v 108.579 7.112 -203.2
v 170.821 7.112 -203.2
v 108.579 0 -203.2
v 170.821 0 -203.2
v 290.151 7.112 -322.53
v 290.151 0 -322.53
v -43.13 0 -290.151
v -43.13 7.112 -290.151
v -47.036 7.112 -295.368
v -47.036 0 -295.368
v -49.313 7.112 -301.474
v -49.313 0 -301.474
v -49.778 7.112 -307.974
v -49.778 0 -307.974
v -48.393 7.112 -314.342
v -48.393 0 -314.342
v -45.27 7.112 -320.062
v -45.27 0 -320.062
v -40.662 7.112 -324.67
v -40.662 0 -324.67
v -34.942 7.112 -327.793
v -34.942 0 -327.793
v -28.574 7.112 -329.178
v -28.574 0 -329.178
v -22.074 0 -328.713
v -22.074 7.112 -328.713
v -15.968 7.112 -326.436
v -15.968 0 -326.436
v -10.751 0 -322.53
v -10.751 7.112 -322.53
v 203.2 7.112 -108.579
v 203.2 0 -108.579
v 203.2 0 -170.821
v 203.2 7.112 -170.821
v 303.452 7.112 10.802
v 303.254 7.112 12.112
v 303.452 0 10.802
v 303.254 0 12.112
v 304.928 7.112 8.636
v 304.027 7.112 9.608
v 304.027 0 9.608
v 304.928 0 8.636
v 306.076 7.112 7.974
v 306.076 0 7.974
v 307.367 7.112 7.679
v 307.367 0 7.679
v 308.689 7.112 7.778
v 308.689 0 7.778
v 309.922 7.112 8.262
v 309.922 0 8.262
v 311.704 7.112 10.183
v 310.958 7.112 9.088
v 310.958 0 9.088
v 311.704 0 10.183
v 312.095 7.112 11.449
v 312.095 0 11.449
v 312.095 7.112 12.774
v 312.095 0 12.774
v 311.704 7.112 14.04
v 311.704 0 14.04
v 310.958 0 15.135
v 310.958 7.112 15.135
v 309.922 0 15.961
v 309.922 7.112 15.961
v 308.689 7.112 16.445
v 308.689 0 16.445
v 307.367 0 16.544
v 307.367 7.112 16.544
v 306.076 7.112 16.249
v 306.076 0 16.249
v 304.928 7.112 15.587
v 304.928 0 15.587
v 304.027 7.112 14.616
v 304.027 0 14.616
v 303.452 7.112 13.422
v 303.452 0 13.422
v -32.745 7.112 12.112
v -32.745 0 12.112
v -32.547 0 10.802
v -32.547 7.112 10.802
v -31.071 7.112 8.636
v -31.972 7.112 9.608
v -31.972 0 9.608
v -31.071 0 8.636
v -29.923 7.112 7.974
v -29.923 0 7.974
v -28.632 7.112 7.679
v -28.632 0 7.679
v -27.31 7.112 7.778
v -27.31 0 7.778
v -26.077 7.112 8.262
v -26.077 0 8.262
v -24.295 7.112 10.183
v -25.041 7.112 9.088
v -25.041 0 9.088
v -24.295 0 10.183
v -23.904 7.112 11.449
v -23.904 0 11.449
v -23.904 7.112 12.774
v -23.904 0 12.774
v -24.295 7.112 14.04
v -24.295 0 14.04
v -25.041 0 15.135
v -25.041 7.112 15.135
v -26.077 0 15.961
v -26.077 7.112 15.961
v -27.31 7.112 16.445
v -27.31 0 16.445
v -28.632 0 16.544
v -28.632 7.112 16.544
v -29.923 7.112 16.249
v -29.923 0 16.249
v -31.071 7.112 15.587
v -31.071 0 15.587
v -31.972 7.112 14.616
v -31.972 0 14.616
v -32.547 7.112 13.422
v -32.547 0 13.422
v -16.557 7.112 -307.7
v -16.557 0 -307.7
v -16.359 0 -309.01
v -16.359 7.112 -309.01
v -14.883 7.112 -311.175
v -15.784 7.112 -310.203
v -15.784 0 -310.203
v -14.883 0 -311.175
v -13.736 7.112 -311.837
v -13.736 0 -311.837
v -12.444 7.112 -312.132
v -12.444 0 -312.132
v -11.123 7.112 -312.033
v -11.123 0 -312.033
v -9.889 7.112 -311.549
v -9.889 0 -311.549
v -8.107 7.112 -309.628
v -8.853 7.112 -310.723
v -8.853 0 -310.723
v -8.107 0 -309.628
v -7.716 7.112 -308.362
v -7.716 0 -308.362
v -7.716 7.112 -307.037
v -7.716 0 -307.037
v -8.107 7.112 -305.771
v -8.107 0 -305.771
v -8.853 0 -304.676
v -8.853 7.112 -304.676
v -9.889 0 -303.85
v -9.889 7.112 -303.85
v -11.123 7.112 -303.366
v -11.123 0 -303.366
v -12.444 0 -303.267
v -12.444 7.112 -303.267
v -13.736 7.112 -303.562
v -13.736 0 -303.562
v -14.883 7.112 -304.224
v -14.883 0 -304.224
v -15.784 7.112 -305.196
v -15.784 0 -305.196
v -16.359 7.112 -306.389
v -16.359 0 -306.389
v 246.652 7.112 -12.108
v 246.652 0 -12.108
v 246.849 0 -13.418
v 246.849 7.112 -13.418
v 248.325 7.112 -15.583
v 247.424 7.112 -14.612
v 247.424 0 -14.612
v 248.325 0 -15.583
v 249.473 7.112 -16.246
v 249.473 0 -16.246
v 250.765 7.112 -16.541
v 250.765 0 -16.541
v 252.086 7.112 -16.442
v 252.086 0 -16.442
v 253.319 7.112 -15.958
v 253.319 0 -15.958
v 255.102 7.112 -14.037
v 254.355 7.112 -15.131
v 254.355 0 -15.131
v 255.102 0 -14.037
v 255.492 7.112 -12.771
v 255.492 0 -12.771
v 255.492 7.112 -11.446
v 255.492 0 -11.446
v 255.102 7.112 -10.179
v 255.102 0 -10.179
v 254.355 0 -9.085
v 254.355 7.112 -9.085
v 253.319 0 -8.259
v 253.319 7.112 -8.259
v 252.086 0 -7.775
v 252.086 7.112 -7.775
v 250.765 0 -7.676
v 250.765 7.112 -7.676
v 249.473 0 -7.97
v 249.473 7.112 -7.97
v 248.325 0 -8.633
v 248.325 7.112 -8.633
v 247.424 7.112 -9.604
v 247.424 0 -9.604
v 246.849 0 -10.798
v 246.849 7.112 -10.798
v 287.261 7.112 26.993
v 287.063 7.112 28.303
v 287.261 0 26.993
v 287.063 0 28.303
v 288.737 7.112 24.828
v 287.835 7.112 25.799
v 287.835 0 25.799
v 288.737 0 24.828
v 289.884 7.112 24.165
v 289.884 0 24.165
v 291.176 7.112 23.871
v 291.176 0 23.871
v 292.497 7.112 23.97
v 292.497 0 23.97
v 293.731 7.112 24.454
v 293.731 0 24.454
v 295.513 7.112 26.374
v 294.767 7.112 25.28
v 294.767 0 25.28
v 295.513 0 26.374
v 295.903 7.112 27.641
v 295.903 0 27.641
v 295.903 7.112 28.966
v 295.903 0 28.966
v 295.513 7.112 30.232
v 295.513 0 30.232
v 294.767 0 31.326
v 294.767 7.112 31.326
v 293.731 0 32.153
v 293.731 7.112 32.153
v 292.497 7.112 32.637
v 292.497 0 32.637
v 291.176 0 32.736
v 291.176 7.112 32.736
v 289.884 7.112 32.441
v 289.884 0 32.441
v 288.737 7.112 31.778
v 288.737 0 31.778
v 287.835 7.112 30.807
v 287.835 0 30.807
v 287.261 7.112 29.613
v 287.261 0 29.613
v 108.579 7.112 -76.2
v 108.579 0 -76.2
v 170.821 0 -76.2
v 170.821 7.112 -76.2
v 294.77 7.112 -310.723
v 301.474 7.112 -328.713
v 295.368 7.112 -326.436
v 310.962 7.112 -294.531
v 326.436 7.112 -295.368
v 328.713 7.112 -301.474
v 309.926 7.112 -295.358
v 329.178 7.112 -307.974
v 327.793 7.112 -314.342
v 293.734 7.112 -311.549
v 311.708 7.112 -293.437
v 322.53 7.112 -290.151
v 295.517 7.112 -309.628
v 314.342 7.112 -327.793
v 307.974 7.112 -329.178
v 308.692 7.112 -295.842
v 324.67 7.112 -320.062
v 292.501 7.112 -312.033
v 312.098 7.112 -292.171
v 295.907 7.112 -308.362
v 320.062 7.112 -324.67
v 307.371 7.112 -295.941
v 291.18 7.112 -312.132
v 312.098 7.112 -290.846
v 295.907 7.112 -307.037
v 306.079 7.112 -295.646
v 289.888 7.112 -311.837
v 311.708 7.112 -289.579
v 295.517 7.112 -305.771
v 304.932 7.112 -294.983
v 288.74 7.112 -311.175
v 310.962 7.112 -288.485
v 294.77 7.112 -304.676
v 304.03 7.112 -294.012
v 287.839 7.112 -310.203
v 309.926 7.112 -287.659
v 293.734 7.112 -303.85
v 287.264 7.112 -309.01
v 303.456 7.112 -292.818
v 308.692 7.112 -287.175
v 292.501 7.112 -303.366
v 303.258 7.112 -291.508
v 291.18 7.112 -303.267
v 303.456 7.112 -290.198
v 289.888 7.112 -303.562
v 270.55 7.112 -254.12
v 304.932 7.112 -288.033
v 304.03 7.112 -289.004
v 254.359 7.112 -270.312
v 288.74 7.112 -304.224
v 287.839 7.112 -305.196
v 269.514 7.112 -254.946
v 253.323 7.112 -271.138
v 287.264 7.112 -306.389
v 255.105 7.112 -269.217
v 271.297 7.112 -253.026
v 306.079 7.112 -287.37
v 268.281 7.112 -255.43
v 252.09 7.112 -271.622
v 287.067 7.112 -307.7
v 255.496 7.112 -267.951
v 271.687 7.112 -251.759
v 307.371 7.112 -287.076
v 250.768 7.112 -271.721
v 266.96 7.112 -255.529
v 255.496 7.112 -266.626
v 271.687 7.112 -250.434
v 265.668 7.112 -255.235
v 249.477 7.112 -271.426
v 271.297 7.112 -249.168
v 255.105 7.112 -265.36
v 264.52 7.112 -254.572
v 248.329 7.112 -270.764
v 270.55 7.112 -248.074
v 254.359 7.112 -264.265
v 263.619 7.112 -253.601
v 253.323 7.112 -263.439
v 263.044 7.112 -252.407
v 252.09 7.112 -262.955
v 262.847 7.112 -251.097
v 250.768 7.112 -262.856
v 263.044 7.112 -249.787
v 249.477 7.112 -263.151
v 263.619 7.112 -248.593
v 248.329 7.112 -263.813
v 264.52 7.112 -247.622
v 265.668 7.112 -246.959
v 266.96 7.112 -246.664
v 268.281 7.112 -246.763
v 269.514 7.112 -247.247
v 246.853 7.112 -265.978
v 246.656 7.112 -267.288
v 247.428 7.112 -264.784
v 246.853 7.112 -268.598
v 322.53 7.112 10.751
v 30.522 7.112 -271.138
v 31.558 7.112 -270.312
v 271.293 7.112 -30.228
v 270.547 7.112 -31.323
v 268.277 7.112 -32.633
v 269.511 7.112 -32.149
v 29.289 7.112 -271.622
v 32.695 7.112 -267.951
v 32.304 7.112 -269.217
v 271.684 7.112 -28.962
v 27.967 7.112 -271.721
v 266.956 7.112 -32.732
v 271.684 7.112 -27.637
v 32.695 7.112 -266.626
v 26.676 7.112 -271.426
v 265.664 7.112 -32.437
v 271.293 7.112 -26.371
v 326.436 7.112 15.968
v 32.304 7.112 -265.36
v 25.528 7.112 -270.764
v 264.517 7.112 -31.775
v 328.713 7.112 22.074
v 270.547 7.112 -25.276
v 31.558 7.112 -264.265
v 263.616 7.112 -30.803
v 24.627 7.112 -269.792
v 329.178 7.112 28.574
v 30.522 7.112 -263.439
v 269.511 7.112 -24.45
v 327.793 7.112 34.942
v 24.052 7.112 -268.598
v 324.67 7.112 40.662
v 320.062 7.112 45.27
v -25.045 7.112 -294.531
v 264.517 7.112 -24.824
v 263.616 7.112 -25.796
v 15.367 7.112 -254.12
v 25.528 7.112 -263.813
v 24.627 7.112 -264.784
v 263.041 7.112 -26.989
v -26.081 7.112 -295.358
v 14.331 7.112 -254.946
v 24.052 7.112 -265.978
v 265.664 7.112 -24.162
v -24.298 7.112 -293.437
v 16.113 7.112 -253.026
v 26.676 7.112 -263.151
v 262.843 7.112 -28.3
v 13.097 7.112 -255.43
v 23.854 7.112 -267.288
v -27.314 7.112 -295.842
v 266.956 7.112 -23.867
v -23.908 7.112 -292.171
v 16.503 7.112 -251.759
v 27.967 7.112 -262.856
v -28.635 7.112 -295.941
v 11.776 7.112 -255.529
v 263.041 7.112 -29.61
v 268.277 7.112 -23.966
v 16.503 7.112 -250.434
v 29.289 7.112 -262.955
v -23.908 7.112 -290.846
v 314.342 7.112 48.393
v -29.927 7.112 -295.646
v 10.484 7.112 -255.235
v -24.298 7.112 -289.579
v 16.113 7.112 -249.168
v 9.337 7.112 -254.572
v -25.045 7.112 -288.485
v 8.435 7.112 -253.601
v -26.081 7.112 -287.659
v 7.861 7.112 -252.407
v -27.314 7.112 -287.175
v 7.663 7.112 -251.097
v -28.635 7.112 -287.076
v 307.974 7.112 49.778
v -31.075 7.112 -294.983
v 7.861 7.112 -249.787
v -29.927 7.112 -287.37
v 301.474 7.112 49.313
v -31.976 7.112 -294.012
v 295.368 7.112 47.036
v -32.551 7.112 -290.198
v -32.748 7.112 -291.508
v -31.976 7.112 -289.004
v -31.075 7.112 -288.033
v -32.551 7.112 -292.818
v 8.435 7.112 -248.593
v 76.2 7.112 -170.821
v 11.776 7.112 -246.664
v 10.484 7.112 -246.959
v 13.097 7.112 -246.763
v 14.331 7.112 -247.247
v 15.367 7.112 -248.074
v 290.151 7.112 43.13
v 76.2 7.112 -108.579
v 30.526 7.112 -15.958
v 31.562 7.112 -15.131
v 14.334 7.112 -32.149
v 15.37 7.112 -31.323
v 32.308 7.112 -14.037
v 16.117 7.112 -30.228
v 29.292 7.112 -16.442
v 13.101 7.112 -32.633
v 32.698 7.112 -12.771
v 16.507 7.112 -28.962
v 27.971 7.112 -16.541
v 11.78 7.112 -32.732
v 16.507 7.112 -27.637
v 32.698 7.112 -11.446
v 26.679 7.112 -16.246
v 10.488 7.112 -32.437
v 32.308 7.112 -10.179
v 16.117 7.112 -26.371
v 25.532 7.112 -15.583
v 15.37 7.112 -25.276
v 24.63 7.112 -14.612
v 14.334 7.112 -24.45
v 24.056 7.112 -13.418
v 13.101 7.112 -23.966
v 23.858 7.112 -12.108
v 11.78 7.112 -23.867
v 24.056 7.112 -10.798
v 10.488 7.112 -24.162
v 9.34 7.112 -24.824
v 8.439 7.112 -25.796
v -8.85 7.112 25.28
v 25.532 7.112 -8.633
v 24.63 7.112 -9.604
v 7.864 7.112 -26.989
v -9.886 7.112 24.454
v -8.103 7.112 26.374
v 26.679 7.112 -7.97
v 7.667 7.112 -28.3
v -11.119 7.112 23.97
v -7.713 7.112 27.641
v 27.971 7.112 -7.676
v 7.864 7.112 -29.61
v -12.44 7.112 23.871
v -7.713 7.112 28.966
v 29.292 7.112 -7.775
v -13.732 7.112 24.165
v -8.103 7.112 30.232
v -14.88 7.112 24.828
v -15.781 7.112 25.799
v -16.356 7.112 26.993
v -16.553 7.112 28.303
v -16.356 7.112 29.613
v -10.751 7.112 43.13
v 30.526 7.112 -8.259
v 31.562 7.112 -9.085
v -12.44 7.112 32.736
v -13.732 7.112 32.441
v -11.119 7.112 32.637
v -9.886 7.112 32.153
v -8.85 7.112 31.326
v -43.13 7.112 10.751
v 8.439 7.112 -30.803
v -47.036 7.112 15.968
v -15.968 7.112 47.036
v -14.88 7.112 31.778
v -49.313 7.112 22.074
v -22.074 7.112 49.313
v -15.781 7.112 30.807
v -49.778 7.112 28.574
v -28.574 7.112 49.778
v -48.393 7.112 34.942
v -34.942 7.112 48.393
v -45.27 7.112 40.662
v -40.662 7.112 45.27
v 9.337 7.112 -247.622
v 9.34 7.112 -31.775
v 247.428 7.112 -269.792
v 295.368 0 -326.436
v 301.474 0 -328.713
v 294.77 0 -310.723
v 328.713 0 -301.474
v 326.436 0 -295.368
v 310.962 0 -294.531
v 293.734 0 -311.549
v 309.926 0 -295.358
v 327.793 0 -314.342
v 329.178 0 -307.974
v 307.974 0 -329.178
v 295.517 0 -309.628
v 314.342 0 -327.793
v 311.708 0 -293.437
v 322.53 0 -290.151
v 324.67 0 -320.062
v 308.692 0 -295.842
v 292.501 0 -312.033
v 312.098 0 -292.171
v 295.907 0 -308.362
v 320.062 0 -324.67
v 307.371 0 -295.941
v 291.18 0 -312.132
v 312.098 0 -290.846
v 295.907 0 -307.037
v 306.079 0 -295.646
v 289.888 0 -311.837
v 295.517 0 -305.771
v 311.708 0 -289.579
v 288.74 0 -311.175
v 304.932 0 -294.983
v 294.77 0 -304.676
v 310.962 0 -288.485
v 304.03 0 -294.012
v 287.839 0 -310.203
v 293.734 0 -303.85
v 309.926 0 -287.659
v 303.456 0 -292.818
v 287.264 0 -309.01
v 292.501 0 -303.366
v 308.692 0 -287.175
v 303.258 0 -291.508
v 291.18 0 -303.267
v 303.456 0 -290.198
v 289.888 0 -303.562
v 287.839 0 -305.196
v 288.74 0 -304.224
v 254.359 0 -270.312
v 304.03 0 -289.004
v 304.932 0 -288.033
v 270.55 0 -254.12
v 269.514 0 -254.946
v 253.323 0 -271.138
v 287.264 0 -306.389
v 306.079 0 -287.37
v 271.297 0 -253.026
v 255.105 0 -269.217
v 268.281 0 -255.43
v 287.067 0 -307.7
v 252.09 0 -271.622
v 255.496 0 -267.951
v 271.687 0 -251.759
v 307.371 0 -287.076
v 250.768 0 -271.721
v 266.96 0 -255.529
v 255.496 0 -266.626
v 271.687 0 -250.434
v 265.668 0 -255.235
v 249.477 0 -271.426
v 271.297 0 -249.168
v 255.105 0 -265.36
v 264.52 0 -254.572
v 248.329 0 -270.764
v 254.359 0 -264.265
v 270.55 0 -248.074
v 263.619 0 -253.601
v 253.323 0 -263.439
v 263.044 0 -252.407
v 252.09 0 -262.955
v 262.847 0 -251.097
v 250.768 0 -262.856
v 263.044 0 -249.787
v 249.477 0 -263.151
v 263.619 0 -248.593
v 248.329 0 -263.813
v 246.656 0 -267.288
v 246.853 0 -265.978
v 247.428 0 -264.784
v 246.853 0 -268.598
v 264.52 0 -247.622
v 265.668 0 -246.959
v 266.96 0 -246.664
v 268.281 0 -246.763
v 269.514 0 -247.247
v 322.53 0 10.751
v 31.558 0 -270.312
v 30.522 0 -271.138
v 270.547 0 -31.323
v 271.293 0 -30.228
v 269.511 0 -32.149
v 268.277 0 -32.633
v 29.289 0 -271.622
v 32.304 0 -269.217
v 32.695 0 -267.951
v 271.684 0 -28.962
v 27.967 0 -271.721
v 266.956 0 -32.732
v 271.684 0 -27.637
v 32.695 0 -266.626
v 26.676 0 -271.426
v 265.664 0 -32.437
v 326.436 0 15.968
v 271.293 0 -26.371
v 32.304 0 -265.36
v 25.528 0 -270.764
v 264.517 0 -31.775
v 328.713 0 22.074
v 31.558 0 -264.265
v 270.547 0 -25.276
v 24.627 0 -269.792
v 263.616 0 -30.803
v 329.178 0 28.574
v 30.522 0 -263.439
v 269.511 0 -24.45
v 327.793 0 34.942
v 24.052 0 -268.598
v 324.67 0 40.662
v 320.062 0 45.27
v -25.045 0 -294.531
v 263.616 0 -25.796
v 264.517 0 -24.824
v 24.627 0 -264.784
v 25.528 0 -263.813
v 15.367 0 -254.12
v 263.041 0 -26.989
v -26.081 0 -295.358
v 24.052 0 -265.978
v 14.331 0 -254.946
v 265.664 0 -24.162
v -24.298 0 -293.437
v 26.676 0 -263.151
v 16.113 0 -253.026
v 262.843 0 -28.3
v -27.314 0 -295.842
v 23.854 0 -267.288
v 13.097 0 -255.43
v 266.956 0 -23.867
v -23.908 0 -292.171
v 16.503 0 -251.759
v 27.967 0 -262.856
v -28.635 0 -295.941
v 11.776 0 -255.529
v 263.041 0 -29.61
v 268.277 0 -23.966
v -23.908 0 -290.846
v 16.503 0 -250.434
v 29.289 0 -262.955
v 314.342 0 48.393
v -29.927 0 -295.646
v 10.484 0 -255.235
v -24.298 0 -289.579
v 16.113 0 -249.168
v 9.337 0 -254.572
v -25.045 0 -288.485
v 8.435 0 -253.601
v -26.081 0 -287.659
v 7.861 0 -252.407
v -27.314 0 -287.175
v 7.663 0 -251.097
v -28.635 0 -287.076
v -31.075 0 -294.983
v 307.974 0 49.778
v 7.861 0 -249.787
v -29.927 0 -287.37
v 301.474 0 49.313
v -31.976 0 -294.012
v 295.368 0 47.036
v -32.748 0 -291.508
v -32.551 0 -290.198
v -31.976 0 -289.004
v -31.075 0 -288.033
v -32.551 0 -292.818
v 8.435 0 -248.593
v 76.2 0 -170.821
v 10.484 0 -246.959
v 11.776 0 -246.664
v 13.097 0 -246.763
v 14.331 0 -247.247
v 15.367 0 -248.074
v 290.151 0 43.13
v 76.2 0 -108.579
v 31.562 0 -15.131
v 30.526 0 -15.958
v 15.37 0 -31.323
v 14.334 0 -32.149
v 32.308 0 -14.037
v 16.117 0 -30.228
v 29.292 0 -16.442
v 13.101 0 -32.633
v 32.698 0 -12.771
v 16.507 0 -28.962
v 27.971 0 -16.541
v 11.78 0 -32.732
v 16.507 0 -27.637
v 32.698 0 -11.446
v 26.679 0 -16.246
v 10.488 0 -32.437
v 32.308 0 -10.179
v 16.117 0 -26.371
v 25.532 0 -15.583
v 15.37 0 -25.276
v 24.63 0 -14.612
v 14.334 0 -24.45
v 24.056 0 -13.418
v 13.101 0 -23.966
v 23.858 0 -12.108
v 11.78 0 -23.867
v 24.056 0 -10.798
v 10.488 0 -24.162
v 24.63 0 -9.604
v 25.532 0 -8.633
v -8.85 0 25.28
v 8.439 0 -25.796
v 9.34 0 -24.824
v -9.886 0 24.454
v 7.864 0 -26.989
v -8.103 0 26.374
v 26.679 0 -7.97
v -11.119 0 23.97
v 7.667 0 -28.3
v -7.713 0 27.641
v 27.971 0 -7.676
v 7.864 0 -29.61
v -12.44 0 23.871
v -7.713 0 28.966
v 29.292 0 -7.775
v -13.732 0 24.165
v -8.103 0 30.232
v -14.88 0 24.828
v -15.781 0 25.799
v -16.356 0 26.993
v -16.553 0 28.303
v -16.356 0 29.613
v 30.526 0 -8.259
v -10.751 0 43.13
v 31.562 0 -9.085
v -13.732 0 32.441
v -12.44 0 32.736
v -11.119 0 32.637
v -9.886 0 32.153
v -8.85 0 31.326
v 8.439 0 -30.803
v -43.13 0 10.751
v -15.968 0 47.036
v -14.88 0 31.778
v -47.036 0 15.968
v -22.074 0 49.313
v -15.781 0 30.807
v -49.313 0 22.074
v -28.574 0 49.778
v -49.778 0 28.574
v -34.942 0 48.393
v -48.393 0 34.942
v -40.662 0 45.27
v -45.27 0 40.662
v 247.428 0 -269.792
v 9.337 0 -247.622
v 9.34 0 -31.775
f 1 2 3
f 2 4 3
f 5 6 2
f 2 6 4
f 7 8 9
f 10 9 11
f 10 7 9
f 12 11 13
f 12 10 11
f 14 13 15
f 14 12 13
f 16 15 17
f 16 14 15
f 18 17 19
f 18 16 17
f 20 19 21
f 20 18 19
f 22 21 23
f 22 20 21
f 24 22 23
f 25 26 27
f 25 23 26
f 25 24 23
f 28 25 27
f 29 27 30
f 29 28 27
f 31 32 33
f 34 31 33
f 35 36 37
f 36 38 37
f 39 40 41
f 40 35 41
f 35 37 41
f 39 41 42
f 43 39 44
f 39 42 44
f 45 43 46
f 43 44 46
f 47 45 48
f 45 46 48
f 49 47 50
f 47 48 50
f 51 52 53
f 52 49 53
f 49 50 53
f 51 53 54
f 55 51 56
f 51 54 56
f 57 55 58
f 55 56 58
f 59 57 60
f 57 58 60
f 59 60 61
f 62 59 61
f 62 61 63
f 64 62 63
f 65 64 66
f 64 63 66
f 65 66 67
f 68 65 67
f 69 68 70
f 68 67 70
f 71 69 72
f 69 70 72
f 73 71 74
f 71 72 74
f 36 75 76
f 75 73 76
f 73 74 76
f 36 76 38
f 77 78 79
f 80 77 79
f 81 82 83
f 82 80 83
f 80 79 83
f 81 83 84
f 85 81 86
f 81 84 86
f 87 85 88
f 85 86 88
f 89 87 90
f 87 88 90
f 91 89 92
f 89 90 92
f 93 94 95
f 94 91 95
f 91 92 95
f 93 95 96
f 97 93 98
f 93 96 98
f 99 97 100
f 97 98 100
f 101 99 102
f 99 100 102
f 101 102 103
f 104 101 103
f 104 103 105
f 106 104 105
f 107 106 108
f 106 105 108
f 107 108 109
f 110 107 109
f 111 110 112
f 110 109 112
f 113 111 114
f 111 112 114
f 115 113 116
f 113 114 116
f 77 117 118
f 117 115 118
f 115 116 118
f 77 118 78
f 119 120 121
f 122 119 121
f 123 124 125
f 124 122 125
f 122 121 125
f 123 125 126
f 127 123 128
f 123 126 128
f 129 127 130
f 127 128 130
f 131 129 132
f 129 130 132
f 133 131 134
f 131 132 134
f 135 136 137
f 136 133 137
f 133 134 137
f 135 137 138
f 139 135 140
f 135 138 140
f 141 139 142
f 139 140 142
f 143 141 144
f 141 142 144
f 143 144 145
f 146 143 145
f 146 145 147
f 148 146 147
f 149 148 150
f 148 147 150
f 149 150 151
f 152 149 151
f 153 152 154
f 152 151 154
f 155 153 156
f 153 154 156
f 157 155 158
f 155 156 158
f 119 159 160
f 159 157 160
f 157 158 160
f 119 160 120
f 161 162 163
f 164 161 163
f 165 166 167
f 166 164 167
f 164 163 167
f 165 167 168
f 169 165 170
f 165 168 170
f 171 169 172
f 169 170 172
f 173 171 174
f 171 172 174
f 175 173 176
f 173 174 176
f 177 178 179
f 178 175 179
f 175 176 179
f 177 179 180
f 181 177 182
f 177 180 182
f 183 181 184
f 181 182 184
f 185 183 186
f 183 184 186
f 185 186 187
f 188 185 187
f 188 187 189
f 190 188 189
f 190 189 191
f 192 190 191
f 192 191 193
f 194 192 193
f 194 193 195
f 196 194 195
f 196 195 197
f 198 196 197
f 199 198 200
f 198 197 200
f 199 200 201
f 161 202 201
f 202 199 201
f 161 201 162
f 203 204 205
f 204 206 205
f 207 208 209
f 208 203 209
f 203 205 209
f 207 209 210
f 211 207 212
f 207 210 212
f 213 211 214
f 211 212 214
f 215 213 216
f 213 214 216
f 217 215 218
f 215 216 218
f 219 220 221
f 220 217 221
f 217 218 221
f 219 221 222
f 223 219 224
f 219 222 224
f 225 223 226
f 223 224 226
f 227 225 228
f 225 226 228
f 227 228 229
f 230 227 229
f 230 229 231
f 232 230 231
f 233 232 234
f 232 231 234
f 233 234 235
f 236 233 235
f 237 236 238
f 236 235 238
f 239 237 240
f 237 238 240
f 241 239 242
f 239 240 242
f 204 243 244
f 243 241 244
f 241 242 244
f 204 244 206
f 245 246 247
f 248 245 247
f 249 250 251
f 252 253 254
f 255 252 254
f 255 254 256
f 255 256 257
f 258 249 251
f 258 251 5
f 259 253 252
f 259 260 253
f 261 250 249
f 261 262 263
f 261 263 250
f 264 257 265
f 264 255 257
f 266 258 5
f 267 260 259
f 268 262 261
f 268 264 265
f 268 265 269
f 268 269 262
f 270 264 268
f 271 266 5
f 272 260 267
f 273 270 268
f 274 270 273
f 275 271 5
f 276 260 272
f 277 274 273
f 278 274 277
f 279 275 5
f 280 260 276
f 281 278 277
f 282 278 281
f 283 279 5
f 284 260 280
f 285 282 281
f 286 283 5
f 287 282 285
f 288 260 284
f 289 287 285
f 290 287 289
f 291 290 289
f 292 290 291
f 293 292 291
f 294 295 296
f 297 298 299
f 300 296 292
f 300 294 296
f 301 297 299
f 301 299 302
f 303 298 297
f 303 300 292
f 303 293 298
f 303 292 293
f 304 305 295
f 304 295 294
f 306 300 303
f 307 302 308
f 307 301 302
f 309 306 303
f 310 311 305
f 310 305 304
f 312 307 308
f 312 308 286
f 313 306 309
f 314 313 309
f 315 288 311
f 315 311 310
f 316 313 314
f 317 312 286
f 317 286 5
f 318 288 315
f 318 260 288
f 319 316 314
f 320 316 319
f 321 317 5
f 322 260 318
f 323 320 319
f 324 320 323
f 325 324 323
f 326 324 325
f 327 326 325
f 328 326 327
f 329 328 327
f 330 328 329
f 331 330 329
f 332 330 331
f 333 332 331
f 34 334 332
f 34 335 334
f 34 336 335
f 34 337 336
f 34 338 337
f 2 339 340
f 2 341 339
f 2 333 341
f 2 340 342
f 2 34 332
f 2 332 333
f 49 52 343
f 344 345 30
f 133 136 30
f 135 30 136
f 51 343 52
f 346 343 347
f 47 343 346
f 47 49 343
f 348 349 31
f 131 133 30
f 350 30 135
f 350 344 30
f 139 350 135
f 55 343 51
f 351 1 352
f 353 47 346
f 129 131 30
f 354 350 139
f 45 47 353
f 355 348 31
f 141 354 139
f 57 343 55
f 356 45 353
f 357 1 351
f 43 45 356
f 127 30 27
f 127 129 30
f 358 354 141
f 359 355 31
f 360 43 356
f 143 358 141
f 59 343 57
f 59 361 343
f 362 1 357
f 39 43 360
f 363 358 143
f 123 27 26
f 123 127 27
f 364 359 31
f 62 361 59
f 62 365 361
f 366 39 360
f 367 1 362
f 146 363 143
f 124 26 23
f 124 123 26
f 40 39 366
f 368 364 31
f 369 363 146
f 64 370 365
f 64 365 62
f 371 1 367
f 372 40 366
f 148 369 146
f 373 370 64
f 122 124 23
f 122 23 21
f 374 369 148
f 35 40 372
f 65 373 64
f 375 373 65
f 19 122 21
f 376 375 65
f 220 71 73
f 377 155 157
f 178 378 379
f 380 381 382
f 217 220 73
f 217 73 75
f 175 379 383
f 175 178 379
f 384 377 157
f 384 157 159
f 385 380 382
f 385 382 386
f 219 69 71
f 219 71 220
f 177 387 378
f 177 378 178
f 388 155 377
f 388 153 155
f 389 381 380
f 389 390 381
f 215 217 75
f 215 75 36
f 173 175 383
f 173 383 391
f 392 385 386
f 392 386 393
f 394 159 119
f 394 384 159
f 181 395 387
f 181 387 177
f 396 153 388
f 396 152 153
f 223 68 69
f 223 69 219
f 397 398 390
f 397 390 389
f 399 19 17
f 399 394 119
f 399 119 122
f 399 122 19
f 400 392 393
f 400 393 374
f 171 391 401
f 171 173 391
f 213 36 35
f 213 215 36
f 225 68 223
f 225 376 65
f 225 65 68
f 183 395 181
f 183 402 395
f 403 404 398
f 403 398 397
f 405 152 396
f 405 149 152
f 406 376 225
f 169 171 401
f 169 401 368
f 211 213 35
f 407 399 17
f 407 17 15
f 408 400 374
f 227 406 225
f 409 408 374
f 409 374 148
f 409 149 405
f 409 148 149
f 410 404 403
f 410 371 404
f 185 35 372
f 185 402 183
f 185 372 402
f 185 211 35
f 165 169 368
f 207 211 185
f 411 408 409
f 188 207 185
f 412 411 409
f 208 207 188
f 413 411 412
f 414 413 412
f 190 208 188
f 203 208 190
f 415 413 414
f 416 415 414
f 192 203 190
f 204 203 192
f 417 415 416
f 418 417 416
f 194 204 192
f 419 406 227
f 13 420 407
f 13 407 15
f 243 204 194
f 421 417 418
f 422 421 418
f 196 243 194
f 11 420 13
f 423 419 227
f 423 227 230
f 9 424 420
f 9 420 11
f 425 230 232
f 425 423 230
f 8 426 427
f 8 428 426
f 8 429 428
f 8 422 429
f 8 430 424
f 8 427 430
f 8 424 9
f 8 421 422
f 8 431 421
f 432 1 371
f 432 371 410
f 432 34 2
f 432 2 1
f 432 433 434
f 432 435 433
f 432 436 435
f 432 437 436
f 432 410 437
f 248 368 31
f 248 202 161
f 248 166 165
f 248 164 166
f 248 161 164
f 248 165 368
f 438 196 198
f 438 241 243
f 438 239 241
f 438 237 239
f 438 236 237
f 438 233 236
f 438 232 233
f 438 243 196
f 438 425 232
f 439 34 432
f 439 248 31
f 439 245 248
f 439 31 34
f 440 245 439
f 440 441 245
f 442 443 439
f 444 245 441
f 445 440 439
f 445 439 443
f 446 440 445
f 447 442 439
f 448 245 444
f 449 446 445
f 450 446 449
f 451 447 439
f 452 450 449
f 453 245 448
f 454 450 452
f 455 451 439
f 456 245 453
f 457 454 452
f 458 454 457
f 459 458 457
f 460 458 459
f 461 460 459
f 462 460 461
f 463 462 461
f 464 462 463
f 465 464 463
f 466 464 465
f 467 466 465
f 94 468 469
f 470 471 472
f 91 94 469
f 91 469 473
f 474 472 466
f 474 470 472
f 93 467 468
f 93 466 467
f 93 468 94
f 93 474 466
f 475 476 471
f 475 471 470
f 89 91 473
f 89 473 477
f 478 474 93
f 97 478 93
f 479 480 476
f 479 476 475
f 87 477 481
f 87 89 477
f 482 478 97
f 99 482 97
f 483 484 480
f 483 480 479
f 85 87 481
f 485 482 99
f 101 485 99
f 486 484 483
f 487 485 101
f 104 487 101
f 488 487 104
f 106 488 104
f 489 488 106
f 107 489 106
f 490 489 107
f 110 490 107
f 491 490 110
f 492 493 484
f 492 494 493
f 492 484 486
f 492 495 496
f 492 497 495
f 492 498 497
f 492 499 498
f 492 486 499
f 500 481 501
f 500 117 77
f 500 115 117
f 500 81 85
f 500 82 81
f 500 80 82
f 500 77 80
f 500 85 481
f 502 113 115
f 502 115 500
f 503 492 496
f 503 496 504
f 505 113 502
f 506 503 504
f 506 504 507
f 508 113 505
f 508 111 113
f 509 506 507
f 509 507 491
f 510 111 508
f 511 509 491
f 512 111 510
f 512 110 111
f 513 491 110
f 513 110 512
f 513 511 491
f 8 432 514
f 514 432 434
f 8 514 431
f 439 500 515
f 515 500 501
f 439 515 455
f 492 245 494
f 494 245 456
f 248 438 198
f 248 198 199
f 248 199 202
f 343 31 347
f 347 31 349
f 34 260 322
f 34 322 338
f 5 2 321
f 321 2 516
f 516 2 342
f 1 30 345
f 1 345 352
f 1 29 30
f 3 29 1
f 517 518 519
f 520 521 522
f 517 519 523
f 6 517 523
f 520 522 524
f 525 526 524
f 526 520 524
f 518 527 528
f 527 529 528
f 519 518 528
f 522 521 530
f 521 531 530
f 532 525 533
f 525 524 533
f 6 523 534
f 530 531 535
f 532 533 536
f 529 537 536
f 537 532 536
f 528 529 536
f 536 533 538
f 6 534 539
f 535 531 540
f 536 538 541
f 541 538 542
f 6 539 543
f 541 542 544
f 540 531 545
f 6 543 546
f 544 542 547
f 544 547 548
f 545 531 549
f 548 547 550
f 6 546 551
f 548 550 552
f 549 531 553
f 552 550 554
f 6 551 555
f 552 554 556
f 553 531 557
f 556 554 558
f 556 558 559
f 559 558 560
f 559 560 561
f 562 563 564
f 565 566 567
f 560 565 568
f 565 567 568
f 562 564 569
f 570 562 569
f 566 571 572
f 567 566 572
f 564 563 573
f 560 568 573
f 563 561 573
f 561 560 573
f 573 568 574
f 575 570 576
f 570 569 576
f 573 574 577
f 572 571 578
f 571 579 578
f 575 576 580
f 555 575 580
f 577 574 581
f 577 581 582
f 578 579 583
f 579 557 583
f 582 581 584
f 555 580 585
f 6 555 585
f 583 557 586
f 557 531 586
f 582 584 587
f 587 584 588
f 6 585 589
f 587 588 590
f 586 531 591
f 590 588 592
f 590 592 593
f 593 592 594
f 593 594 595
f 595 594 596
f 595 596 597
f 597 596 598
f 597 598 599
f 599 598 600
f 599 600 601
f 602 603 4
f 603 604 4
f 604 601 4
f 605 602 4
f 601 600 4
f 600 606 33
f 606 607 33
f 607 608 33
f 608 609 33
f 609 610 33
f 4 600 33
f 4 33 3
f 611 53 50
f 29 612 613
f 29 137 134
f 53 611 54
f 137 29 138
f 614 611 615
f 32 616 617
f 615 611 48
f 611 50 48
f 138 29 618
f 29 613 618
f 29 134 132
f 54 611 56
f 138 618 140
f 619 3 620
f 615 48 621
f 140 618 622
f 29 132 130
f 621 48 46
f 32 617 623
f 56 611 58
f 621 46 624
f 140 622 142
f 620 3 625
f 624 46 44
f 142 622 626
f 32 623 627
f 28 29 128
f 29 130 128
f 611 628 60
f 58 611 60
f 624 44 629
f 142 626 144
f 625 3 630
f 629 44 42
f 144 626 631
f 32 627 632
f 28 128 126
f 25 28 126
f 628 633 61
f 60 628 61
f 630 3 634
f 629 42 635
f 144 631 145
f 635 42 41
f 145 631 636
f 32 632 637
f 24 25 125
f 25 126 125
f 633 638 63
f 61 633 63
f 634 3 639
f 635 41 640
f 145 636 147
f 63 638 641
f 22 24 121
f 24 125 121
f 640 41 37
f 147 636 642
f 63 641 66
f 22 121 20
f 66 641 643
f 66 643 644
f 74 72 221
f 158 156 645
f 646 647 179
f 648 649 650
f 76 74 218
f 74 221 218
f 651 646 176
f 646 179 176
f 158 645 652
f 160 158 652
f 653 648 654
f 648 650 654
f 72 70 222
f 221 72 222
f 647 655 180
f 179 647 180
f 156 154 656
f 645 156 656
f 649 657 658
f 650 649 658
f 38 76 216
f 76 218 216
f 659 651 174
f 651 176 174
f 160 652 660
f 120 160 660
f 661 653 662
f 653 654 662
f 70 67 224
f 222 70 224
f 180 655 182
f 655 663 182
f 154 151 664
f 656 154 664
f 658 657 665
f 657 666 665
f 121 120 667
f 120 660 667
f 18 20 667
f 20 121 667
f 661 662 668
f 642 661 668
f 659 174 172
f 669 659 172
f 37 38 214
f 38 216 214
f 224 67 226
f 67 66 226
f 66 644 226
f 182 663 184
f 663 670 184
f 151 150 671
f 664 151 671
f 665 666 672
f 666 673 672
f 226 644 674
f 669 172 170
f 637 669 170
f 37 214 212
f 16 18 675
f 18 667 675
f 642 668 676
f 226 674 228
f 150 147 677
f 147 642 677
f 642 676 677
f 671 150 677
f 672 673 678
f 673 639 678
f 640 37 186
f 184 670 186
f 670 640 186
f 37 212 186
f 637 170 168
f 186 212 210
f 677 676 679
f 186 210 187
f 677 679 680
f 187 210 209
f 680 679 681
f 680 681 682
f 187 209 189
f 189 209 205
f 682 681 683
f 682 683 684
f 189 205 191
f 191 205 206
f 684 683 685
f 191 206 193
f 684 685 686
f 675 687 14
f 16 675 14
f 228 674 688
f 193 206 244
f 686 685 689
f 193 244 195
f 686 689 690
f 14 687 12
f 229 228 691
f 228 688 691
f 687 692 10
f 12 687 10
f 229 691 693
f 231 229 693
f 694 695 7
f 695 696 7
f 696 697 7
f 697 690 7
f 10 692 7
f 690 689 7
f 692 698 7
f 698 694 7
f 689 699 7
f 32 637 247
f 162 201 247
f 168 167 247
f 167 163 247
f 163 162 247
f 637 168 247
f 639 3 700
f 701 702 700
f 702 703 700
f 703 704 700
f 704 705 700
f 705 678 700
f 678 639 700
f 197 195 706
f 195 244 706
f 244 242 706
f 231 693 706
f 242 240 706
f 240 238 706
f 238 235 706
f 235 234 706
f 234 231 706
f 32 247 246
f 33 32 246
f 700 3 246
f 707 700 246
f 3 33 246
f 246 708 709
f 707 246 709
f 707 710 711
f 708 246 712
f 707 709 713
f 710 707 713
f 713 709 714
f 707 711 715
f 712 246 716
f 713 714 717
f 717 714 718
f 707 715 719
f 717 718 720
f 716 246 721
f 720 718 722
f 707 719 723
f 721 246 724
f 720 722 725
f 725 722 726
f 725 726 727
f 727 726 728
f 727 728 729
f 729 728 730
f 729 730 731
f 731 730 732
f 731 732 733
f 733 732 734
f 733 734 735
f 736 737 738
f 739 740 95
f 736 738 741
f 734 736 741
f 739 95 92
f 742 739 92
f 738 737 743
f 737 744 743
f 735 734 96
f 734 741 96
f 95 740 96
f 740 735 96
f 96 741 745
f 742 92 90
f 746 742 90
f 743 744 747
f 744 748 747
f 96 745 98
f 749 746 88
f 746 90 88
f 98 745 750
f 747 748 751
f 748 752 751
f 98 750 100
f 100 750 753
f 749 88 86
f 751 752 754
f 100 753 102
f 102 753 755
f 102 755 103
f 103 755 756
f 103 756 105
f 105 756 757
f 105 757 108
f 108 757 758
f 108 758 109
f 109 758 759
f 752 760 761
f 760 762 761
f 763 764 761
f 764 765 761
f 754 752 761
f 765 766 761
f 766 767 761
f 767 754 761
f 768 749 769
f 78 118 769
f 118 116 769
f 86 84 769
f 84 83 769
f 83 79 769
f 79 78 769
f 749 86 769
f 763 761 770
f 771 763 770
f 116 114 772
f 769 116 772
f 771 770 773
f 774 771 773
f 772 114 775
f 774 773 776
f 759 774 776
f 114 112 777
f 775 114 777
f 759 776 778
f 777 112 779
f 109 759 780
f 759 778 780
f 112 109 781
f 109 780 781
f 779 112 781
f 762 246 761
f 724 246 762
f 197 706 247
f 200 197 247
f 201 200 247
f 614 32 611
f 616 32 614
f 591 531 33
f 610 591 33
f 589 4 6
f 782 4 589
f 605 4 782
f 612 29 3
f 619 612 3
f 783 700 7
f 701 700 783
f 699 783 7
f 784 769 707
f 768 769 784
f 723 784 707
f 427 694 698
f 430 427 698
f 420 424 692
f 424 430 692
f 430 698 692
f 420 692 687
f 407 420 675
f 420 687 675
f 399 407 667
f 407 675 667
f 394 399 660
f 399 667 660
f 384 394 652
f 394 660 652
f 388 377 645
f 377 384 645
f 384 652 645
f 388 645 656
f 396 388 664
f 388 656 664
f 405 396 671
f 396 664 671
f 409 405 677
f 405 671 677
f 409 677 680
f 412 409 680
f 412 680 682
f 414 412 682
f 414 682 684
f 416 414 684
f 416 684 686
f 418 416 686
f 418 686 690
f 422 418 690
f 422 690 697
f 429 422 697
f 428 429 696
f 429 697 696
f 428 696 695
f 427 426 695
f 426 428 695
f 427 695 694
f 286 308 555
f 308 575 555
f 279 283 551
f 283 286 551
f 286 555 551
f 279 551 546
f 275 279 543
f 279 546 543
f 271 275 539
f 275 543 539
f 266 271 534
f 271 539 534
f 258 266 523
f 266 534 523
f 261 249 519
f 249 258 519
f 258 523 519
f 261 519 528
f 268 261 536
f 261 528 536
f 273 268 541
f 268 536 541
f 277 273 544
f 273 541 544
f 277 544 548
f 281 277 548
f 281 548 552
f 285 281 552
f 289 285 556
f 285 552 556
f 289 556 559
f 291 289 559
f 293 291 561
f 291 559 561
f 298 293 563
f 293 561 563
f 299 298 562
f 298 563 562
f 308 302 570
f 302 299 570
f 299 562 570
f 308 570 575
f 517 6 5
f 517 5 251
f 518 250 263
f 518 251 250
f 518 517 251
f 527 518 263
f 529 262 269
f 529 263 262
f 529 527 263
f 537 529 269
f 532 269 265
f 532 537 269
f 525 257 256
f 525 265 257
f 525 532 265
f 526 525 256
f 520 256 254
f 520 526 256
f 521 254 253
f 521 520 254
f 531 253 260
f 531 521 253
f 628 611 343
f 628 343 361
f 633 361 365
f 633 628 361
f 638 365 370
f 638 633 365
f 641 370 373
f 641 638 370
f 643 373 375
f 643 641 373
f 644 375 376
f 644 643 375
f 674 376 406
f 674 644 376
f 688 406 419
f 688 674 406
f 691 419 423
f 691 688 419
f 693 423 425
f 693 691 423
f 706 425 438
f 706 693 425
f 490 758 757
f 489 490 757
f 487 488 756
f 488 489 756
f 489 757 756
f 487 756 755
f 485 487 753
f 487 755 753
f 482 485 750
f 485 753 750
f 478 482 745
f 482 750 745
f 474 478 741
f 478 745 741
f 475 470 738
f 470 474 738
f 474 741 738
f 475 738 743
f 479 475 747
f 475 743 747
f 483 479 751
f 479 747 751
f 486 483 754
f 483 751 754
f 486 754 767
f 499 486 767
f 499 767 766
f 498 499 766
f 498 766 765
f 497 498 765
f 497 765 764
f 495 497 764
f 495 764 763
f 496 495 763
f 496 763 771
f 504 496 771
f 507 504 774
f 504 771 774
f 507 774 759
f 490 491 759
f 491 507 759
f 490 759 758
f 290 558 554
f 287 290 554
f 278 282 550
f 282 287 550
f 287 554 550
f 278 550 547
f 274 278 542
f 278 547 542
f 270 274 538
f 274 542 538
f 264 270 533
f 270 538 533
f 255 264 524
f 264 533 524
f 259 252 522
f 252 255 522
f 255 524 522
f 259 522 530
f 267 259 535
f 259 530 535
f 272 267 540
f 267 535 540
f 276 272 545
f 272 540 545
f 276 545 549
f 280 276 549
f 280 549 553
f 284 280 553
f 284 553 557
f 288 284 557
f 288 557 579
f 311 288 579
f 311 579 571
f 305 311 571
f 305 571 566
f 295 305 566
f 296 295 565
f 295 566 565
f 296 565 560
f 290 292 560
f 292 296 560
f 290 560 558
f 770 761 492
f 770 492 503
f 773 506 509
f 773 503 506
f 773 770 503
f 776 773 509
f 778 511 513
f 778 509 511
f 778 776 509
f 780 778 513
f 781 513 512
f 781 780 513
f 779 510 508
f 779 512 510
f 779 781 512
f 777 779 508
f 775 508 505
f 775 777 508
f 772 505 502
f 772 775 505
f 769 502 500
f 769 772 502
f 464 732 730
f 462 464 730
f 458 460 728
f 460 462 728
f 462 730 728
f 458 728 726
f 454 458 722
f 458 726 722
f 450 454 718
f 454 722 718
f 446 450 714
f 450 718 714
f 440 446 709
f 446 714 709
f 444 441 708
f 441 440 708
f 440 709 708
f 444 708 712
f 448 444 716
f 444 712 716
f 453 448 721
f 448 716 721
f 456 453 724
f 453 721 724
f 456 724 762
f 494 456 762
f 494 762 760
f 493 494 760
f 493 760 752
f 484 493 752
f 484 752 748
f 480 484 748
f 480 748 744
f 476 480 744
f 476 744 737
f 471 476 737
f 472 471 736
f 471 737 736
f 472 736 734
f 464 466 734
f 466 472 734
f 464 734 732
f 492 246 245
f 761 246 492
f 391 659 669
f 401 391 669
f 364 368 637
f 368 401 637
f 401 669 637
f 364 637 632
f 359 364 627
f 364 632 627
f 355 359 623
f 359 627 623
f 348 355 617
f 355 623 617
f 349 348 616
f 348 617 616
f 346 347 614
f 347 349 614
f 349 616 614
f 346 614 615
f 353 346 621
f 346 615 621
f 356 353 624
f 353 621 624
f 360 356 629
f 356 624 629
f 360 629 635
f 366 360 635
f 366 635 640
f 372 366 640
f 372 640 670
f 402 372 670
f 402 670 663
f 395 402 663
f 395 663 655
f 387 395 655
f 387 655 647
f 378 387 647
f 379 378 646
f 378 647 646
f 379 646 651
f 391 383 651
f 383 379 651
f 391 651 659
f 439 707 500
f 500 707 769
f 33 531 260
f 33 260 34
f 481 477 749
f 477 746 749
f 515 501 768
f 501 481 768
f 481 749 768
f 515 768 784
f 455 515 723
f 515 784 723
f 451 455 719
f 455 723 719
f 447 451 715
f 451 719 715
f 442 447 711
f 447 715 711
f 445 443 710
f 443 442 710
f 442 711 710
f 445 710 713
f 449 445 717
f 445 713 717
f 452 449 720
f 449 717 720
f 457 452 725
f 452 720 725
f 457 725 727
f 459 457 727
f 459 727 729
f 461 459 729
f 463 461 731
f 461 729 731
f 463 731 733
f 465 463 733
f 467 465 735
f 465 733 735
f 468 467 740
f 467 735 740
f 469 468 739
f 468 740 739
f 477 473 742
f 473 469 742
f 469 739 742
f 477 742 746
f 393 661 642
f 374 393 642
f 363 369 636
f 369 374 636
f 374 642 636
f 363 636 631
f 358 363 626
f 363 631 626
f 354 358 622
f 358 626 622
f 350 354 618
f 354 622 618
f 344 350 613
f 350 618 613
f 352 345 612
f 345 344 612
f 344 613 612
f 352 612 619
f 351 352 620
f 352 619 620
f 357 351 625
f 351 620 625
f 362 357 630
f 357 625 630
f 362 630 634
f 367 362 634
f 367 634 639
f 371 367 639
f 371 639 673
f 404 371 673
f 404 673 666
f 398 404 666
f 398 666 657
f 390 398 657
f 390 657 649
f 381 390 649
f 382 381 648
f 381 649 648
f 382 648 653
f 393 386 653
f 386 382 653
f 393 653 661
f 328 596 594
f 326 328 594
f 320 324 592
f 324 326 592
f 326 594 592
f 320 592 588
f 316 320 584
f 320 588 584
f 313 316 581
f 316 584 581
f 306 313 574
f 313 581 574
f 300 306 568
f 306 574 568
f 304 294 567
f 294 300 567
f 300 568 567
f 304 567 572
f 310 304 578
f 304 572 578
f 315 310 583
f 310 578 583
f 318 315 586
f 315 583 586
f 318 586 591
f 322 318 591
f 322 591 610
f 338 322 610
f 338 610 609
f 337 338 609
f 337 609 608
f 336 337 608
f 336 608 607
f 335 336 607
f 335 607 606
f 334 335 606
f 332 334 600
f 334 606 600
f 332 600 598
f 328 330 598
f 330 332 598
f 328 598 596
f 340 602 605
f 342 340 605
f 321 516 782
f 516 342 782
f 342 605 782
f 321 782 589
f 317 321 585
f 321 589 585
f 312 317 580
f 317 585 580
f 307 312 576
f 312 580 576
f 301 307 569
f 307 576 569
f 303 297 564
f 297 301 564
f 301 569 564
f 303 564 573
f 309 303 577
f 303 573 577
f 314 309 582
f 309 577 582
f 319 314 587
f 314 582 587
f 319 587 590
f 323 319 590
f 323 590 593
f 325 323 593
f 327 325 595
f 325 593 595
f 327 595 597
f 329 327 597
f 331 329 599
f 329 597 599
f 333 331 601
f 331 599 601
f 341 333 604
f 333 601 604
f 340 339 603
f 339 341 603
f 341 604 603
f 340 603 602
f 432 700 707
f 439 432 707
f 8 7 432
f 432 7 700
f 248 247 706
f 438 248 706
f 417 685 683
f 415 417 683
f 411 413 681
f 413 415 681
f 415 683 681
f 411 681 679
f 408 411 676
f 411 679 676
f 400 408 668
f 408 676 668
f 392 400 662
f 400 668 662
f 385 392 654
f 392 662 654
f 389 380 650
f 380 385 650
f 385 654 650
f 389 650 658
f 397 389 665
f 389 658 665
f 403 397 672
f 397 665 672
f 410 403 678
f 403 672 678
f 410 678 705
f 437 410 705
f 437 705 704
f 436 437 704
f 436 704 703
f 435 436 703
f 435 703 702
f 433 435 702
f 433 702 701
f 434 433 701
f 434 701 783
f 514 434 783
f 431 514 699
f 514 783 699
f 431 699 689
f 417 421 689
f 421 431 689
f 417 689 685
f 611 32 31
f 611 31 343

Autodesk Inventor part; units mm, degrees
ref_plane "YZ Plane" through (0, 0, 0) normal (1, 0, 0) x (0, 1, 0)
ref_plane "XZ Plane" through (0, 0, 0) normal (0, 1, 0) x (-1, 0, 0)
ref_plane "XY Plane" through (0, 0, 0) normal (0, 0, 1) x (1, 0, 0)
sketch "Sketch1" plane through (0, 0, 0) normal (0, 1, 0) x (-1, 0, 0)
  line L0 (-16.1896, 16.1896) -> (10.7512, 43.1304)
  line L1 (-295.5896, -16.1896) -> (-322.5304, 10.7512)
  line L2 (16.1896, -263.2104) -> (43.1304, -290.1512)
  line L3 (-43.1304, -268.6488) -> (10.7512, -322.5304)
  line L4 (-10.7512, -236.2696) -> (16.1896, -263.2104)
  line L5 (-295.5896, -263.2104) -> (-268.6488, -236.2696)
  line L6 (-290.1512, -322.5304) -> (-236.2696, -268.6488)
  line L7 (-322.5304, -290.1512) -> (-295.5896, -263.2104)
  arc A0 (-290.1512, 43.1304) -> (-322.5304, 10.7512) centre (-306.3408, 26.9408) ccw
  arc A1 (-322.5304, -290.1512) -> (-290.1512, -322.5304) centre (-306.3408, -306.3408) ccw
  arc A2 (10.7512, -322.5304) -> (43.1304, -290.1512) centre (26.9408, -306.3408) ccw
  arc A3 (43.1304, 10.7512) -> (10.7512, 43.1304) centre (26.9408, 26.9408) ccw
  line L8 (-329.2363, 49.8363) -> (49.8363, 49.8363)
  line L9 (49.8363, -329.2363) -> (49.8363, 49.8363)
  line L10 (49.8363, -329.2363) -> (-329.2363, -329.2363)
  line L11 (-329.2363, 49.8363) -> (-329.2363, -329.2363)
  line L12 (-10.7512, -236.2696) -> (-76.2, -170.8208)
  line L13 (-170.8208, -76.2) -> (-290.1512, 43.1304)
  line L14 (-43.1304, -268.6488) -> (-108.5792, -203.2)
  line L15 (-203.2, -108.5792) -> (-295.5896, -16.1896)
  line L16 (-236.2696, -268.6488) -> (-170.8208, -203.2)
  line L17 (-76.2, -108.5792) -> (43.1304, 10.7512)
  line L18 (-268.6488, -236.2696) -> (-203.2, -170.8208)
  line L19 (-108.5792, -76.2) -> (-16.1896, 16.1896)
  line L20 (-108.5792, -76.2) -> (-170.8208, -76.2)
  line L21 (-203.2, -108.5792) -> (-203.2, -170.8208)
  line L22 (-170.8208, -203.2) -> (-108.5792, -203.2)
  line L23 (-76.2, -170.8208) -> (-76.2, -108.5792)
  circle A4 centre (2254.858, -433.3281) radius 4.2386
  circle A5 centre (2254.858, -433.3281) radius 14.0056
  line L24 (2254.858, -433.3281) -> (2238.6684, -449.5177)
  line L25 (2254.858, -433.3281) -> (2271.0476, -417.1385)
  line L26 (2238.6684, -449.5177) -> (2211.7277, -422.5769)
  line L27 (2271.0476, -417.1385) -> (2297.9884, -444.0792)
  line L28 (2211.7277, -422.5769) -> (2265.6092, -476.4584)
  line L29 (2265.6092, -476.4584) -> (2297.9884, -444.0792)
  line L30 (2297.9884, -444.0792) -> (2244.1069, -390.1977)
  line L31 (2244.1069, -390.1977) -> (2211.7277, -422.5769)
  line L32 (-29.66, -282.1192) -> (-43.1304, -268.6488)
  line L33 (-43.1304, -268.6488) -> (-29.66, -282.1192)
  line L34 (2.7192, -249.74) -> (-10.7512, -236.2696)
  line L35 (-10.7512, -236.2696) -> (-43.1304, -268.6488)
  line L36 (-43.1304, -268.6488) -> (-29.66, -282.1192)
  line L37 (-29.66, -282.1192) -> (2.7192, -249.74)
  line L38 (-43.1304, -268.6488) -> (-36.3952, -275.384)
  circle A6 centre (-28.2995, -267.2883) radius 4.445
  circle A7 centre (-12.1081, -251.0969) radius 4.445
  line L39 (10.7512, -322.5304) -> (43.1304, -290.1512)
  circle A8 centre (28.3031, -291.5081) radius 4.445
  line L40 (43.1304, -290.1512) -> (29.66, -276.6808)
  line L41 (29.66, -276.6808) -> (-2.7192, -309.06)
  line L42 (29.66, -276.6808) -> (-2.7192, -309.06)
  circle A9 centre (12.1117, -307.6995) radius 4.445
  line L43 (10.7512, -322.5304) -> (-2.7192, -309.06)
  line L44 (-2.7192, -309.06) -> (10.7512, -322.5304)
  line L45 (-2.7192, -309.06) -> (4.016, -315.7952)
  line L46 (-2.7192, -309.06) -> (10.7512, -322.5304)
  line L47 (-76.2, -170.8208) -> (-114.6919, -170.8208)
  circle A10 centre (-279.4, 0) radius 4.2386
  circle A11 centre (-279.4, 0) radius 14.0056
  line L48 (-322.5304, 10.7512) -> (-268.6488, -43.1304)
  line L49 (-236.2696, -10.7512) -> (-290.1512, 43.1304)
  line L50 (-268.6488, -43.1304) -> (-236.2696, -10.7512)
  line L51 (-263.2104, 16.1896) -> (-236.2696, -10.7512)
  line L52 (-279.4, 0) -> (-295.5896, -16.1896)
  line L53 (-279.4, 0) -> (-263.2104, 16.1896)
  circle A12 centre (-291.5081, 28.3031) radius 4.445
  line L54 (-309.06, -2.7192) -> (-276.6808, 29.66)
  line L55 (-276.6808, 29.66) -> (-290.1512, 43.1304)
  line L56 (-290.1512, 43.1304) -> (-322.5304, 10.7512)
  line L57 (-290.1512, 43.1304) -> (-322.5304, 10.7512)
  circle A13 centre (-307.6995, 12.1117) radius 4.445
  line L58 (-295.5896, -16.1896) -> (-322.5304, 10.7512)
  line L59 (-309.06, -2.7192) -> (-322.5304, 10.7512)
  line L60 (-322.5304, 10.7512) -> (-309.06, -2.7192)
  line L61 (-322.5304, 10.7512) -> (-309.06, -2.7192)
  line L62 (-322.5304, 10.7512) -> (-315.7952, 4.016)
  circle A14 centre (-251.0969, -12.1081) radius 4.445
  line L63 (-249.74, 2.7192) -> (-282.1192, -29.66)
  line L64 (-249.74, 2.7192) -> (-282.1192, -29.66)
  line L65 (-282.1192, -29.66) -> (-275.384, -36.3952)
  circle A15 centre (-267.2883, -28.2995) radius 4.445
  line L66 (-268.6488, -43.1304) -> (-236.2696, -10.7512)
  line L67 (-268.6488, -43.1304) -> (-282.1192, -29.66)
  line L68 (-282.1192, -29.66) -> (-268.6488, -43.1304)
  line L69 (-282.1192, -29.66) -> (-268.6488, -43.1304)
  line L70 (-236.2696, -10.7512) -> (-249.74, 2.7192)
  circle A16 centre (0, 0) radius 4.2386
  circle A17 centre (0, 0) radius 14.0056
  line L71 (-10.7512, -43.1304) -> (43.1304, 10.7512)
  line L72 (10.7512, 43.1304) -> (-43.1304, -10.7512)
  line L73 (43.1304, 10.7512) -> (10.7512, 43.1304)
  line L74 (-16.1896, 16.1896) -> (10.7512, 43.1304)
  line L75 (0, 0) -> (16.1896, -16.1896)
  line L76 (0, 0) -> (-16.1896, 16.1896)
  circle A18 centre (-28.3031, -12.1081) radius 4.445
  line L77 (2.7192, -29.66) -> (-29.66, 2.7192)
  line L78 (-29.66, 2.7192) -> (-43.1304, -10.7512)
  line L79 (-43.1304, -10.7512) -> (-10.7512, -43.1304)
  line L80 (-43.1304, -10.7512) -> (-10.7512, -43.1304)
  circle A19 centre (-12.1117, -28.2995) radius 4.445
  line L81 (16.1896, -16.1896) -> (-10.7512, -43.1304)
  line L82 (2.7192, -29.66) -> (-10.7512, -43.1304)
  line L83 (-10.7512, -43.1304) -> (2.7192, -29.66)
  line L84 (-10.7512, -43.1304) -> (2.7192, -29.66)
  line L85 (-10.7512, -43.1304) -> (-4.016, -36.3952)
  circle A20 centre (12.1081, 28.3031) radius 4.445
  line L86 (-2.7192, 29.66) -> (29.66, -2.7192)
  line L87 (-2.7192, 29.66) -> (29.66, -2.7192)
  line L88 (29.66, -2.7192) -> (36.3952, 4.016)
  circle A21 centre (28.2995, 12.1117) radius 4.445
  line L89 (43.1304, 10.7512) -> (10.7512, 43.1304)
  line L90 (43.1304, 10.7512) -> (29.66, -2.7192)
  line L91 (29.66, -2.7192) -> (43.1304, 10.7512)
  line L92 (29.66, -2.7192) -> (43.1304, 10.7512)
  line L93 (10.7512, 43.1304) -> (-2.7192, 29.66)
  circle A22 centre (-291.5117, -307.6995) radius 4.445
  circle A23 centre (-307.7031, -291.5081) radius 4.445
  line L94 (-309.06, -276.6808) -> (-322.5304, -290.1512)
  line L95 (-276.6808, -309.06) -> (-290.1512, -322.5304)
  line L96 (-290.1512, -322.5304) -> (-276.6808, -309.06)
  line L97 (-290.1512, -322.5304) -> (-276.6808, -309.06)
  line L98 (-263.2104, -295.5896) -> (-290.1512, -322.5304)
  line L99 (-268.6488, -236.2696) -> (-322.5304, -290.1512)
  line L100 (-290.1512, -322.5304) -> (-236.2696, -268.6488)
  line L101 (-290.1512, -322.5304) -> (-283.416, -315.7952)
  line L102 (-268.6488, -236.2696) -> (-282.1192, -249.74)
  circle A24 centre (-267.2919, -251.0969) radius 4.445
  line L103 (-295.5896, -263.2104) -> (-268.6488, -236.2696)
  circle A25 centre (-251.1005, -267.2883) radius 4.445
  line L104 (-249.74, -282.1192) -> (-243.0048, -275.384)
  line L105 (-249.74, -282.1192) -> (-236.2696, -268.6488)
  line L106 (-249.74, -282.1192) -> (-236.2696, -268.6488)
  line L107 (-236.2696, -268.6488) -> (-249.74, -282.1192)
  line L108 (-290.1512, -322.5304) -> (-322.5304, -290.1512)
  point P0 (-279.4, 0)
  point P1 (-279.4, -279.4)
  dimension "d68" = 379.0727
  dimension "d69" = 379.0727
  dimension "d70" = 379.0727
  dimension "d77" = 45.7911
  dimension "d78" = 8.4772
  dimension "d79" = 28.0111
  dimension "d80" = 22.8956
  dimension "d81" = 22.8956
  dimension "d82" = 38.1
  dimension "d83" = 38.1
  dimension "d84" = 45.7962
  dimension "d85" = 76.2
  dimension "d86" = 45.7911
  dimension "d87" = 19.05
  dimension "d88" = 19.05
  dimension "d89" = 9.525
  dimension "d90" = 8.89
  dimension "d91" = 45.7911
  dimension "d92" = 45.7911
  dimension "d93" = 19.05
  dimension "d94" = 19.05
  dimension "d95" = 9.525
  dimension "d96" = 8.89
  dimension "d97" = 135
  dimension "d98" = 8.4772
  dimension "d99" = 28.0111
  dimension "d100" = 22.8956
  dimension "d101" = 22.8956
  dimension "d102" = 38.1
  dimension "d103" = 38.1
  dimension "d104" = 45.7911
  dimension "d105" = 76.2
  dimension "d106" = 45.7911
  dimension "d107" = 19.05
  dimension "d108" = 19.05
  dimension "d109" = 9.525
  dimension "d110" = 8.89
  dimension "d111" = 45.7911
  dimension "d112" = 45.7911
  dimension "d113" = 19.05
  dimension "d114" = 19.05
  dimension "d115" = 9.525
  dimension "d116" = 8.89
  dimension "d117" = 8.4772
  dimension "d118" = 28.0111
  dimension "d119" = 22.8956
  dimension "d120" = 22.8956
  dimension "d121" = 38.1
  dimension "d122" = 38.1
  dimension "d123" = 45.7962
  dimension "d124" = 76.2
  dimension "d125" = 45.7911
  dimension "d126" = 19.05
  dimension "d127" = 19.05
  dimension "d128" = 9.525
  dimension "d129" = 8.89
  dimension "d130" = 45.7911
  dimension "d131" = 45.7911
  dimension "d132" = 19.05
  dimension "d133" = 19.05
  dimension "d134" = 9.525
  dimension "d135" = 8.89
  dimension "d140" = 38.1
  dimension "d141" = 38.1
extrude "Extrusion2" add sketch "Sketch1" along normal blind 7.112 contours L76 A17 L75 L17 L77 L19 | L0 L86 L17 L75 A17 L76 | L0 L73 L17 L86 | L77 L17 L79 L19 | L76 A16 L75 A17 | A17 L75 A16 L76 | A3 L73 | L79 L17 L23 L12 L35 L14 L22 L16 L6 L108 L7 L5 L18 L21 L15 L50 L13 L20 L19 | L76 L75 A16 | A16 L75 L76 | A0 L56 | A2 L39 | L13 L54 L1 L56 | L50 L15 L63 L13 | L39 L3 L41 L2 | L13 L53 A11 L52 L1 L54 | A1 L108 | L63 L15 L52 A11 L53 L13 | L4 L37 L3 L35 | L41 L3 L37 L4 L2 | L53 A10 L52 A11 | A11 L52 A10 L53 | L53 L52 A10 | A10 L52 L53
properties part number "drone frame"
